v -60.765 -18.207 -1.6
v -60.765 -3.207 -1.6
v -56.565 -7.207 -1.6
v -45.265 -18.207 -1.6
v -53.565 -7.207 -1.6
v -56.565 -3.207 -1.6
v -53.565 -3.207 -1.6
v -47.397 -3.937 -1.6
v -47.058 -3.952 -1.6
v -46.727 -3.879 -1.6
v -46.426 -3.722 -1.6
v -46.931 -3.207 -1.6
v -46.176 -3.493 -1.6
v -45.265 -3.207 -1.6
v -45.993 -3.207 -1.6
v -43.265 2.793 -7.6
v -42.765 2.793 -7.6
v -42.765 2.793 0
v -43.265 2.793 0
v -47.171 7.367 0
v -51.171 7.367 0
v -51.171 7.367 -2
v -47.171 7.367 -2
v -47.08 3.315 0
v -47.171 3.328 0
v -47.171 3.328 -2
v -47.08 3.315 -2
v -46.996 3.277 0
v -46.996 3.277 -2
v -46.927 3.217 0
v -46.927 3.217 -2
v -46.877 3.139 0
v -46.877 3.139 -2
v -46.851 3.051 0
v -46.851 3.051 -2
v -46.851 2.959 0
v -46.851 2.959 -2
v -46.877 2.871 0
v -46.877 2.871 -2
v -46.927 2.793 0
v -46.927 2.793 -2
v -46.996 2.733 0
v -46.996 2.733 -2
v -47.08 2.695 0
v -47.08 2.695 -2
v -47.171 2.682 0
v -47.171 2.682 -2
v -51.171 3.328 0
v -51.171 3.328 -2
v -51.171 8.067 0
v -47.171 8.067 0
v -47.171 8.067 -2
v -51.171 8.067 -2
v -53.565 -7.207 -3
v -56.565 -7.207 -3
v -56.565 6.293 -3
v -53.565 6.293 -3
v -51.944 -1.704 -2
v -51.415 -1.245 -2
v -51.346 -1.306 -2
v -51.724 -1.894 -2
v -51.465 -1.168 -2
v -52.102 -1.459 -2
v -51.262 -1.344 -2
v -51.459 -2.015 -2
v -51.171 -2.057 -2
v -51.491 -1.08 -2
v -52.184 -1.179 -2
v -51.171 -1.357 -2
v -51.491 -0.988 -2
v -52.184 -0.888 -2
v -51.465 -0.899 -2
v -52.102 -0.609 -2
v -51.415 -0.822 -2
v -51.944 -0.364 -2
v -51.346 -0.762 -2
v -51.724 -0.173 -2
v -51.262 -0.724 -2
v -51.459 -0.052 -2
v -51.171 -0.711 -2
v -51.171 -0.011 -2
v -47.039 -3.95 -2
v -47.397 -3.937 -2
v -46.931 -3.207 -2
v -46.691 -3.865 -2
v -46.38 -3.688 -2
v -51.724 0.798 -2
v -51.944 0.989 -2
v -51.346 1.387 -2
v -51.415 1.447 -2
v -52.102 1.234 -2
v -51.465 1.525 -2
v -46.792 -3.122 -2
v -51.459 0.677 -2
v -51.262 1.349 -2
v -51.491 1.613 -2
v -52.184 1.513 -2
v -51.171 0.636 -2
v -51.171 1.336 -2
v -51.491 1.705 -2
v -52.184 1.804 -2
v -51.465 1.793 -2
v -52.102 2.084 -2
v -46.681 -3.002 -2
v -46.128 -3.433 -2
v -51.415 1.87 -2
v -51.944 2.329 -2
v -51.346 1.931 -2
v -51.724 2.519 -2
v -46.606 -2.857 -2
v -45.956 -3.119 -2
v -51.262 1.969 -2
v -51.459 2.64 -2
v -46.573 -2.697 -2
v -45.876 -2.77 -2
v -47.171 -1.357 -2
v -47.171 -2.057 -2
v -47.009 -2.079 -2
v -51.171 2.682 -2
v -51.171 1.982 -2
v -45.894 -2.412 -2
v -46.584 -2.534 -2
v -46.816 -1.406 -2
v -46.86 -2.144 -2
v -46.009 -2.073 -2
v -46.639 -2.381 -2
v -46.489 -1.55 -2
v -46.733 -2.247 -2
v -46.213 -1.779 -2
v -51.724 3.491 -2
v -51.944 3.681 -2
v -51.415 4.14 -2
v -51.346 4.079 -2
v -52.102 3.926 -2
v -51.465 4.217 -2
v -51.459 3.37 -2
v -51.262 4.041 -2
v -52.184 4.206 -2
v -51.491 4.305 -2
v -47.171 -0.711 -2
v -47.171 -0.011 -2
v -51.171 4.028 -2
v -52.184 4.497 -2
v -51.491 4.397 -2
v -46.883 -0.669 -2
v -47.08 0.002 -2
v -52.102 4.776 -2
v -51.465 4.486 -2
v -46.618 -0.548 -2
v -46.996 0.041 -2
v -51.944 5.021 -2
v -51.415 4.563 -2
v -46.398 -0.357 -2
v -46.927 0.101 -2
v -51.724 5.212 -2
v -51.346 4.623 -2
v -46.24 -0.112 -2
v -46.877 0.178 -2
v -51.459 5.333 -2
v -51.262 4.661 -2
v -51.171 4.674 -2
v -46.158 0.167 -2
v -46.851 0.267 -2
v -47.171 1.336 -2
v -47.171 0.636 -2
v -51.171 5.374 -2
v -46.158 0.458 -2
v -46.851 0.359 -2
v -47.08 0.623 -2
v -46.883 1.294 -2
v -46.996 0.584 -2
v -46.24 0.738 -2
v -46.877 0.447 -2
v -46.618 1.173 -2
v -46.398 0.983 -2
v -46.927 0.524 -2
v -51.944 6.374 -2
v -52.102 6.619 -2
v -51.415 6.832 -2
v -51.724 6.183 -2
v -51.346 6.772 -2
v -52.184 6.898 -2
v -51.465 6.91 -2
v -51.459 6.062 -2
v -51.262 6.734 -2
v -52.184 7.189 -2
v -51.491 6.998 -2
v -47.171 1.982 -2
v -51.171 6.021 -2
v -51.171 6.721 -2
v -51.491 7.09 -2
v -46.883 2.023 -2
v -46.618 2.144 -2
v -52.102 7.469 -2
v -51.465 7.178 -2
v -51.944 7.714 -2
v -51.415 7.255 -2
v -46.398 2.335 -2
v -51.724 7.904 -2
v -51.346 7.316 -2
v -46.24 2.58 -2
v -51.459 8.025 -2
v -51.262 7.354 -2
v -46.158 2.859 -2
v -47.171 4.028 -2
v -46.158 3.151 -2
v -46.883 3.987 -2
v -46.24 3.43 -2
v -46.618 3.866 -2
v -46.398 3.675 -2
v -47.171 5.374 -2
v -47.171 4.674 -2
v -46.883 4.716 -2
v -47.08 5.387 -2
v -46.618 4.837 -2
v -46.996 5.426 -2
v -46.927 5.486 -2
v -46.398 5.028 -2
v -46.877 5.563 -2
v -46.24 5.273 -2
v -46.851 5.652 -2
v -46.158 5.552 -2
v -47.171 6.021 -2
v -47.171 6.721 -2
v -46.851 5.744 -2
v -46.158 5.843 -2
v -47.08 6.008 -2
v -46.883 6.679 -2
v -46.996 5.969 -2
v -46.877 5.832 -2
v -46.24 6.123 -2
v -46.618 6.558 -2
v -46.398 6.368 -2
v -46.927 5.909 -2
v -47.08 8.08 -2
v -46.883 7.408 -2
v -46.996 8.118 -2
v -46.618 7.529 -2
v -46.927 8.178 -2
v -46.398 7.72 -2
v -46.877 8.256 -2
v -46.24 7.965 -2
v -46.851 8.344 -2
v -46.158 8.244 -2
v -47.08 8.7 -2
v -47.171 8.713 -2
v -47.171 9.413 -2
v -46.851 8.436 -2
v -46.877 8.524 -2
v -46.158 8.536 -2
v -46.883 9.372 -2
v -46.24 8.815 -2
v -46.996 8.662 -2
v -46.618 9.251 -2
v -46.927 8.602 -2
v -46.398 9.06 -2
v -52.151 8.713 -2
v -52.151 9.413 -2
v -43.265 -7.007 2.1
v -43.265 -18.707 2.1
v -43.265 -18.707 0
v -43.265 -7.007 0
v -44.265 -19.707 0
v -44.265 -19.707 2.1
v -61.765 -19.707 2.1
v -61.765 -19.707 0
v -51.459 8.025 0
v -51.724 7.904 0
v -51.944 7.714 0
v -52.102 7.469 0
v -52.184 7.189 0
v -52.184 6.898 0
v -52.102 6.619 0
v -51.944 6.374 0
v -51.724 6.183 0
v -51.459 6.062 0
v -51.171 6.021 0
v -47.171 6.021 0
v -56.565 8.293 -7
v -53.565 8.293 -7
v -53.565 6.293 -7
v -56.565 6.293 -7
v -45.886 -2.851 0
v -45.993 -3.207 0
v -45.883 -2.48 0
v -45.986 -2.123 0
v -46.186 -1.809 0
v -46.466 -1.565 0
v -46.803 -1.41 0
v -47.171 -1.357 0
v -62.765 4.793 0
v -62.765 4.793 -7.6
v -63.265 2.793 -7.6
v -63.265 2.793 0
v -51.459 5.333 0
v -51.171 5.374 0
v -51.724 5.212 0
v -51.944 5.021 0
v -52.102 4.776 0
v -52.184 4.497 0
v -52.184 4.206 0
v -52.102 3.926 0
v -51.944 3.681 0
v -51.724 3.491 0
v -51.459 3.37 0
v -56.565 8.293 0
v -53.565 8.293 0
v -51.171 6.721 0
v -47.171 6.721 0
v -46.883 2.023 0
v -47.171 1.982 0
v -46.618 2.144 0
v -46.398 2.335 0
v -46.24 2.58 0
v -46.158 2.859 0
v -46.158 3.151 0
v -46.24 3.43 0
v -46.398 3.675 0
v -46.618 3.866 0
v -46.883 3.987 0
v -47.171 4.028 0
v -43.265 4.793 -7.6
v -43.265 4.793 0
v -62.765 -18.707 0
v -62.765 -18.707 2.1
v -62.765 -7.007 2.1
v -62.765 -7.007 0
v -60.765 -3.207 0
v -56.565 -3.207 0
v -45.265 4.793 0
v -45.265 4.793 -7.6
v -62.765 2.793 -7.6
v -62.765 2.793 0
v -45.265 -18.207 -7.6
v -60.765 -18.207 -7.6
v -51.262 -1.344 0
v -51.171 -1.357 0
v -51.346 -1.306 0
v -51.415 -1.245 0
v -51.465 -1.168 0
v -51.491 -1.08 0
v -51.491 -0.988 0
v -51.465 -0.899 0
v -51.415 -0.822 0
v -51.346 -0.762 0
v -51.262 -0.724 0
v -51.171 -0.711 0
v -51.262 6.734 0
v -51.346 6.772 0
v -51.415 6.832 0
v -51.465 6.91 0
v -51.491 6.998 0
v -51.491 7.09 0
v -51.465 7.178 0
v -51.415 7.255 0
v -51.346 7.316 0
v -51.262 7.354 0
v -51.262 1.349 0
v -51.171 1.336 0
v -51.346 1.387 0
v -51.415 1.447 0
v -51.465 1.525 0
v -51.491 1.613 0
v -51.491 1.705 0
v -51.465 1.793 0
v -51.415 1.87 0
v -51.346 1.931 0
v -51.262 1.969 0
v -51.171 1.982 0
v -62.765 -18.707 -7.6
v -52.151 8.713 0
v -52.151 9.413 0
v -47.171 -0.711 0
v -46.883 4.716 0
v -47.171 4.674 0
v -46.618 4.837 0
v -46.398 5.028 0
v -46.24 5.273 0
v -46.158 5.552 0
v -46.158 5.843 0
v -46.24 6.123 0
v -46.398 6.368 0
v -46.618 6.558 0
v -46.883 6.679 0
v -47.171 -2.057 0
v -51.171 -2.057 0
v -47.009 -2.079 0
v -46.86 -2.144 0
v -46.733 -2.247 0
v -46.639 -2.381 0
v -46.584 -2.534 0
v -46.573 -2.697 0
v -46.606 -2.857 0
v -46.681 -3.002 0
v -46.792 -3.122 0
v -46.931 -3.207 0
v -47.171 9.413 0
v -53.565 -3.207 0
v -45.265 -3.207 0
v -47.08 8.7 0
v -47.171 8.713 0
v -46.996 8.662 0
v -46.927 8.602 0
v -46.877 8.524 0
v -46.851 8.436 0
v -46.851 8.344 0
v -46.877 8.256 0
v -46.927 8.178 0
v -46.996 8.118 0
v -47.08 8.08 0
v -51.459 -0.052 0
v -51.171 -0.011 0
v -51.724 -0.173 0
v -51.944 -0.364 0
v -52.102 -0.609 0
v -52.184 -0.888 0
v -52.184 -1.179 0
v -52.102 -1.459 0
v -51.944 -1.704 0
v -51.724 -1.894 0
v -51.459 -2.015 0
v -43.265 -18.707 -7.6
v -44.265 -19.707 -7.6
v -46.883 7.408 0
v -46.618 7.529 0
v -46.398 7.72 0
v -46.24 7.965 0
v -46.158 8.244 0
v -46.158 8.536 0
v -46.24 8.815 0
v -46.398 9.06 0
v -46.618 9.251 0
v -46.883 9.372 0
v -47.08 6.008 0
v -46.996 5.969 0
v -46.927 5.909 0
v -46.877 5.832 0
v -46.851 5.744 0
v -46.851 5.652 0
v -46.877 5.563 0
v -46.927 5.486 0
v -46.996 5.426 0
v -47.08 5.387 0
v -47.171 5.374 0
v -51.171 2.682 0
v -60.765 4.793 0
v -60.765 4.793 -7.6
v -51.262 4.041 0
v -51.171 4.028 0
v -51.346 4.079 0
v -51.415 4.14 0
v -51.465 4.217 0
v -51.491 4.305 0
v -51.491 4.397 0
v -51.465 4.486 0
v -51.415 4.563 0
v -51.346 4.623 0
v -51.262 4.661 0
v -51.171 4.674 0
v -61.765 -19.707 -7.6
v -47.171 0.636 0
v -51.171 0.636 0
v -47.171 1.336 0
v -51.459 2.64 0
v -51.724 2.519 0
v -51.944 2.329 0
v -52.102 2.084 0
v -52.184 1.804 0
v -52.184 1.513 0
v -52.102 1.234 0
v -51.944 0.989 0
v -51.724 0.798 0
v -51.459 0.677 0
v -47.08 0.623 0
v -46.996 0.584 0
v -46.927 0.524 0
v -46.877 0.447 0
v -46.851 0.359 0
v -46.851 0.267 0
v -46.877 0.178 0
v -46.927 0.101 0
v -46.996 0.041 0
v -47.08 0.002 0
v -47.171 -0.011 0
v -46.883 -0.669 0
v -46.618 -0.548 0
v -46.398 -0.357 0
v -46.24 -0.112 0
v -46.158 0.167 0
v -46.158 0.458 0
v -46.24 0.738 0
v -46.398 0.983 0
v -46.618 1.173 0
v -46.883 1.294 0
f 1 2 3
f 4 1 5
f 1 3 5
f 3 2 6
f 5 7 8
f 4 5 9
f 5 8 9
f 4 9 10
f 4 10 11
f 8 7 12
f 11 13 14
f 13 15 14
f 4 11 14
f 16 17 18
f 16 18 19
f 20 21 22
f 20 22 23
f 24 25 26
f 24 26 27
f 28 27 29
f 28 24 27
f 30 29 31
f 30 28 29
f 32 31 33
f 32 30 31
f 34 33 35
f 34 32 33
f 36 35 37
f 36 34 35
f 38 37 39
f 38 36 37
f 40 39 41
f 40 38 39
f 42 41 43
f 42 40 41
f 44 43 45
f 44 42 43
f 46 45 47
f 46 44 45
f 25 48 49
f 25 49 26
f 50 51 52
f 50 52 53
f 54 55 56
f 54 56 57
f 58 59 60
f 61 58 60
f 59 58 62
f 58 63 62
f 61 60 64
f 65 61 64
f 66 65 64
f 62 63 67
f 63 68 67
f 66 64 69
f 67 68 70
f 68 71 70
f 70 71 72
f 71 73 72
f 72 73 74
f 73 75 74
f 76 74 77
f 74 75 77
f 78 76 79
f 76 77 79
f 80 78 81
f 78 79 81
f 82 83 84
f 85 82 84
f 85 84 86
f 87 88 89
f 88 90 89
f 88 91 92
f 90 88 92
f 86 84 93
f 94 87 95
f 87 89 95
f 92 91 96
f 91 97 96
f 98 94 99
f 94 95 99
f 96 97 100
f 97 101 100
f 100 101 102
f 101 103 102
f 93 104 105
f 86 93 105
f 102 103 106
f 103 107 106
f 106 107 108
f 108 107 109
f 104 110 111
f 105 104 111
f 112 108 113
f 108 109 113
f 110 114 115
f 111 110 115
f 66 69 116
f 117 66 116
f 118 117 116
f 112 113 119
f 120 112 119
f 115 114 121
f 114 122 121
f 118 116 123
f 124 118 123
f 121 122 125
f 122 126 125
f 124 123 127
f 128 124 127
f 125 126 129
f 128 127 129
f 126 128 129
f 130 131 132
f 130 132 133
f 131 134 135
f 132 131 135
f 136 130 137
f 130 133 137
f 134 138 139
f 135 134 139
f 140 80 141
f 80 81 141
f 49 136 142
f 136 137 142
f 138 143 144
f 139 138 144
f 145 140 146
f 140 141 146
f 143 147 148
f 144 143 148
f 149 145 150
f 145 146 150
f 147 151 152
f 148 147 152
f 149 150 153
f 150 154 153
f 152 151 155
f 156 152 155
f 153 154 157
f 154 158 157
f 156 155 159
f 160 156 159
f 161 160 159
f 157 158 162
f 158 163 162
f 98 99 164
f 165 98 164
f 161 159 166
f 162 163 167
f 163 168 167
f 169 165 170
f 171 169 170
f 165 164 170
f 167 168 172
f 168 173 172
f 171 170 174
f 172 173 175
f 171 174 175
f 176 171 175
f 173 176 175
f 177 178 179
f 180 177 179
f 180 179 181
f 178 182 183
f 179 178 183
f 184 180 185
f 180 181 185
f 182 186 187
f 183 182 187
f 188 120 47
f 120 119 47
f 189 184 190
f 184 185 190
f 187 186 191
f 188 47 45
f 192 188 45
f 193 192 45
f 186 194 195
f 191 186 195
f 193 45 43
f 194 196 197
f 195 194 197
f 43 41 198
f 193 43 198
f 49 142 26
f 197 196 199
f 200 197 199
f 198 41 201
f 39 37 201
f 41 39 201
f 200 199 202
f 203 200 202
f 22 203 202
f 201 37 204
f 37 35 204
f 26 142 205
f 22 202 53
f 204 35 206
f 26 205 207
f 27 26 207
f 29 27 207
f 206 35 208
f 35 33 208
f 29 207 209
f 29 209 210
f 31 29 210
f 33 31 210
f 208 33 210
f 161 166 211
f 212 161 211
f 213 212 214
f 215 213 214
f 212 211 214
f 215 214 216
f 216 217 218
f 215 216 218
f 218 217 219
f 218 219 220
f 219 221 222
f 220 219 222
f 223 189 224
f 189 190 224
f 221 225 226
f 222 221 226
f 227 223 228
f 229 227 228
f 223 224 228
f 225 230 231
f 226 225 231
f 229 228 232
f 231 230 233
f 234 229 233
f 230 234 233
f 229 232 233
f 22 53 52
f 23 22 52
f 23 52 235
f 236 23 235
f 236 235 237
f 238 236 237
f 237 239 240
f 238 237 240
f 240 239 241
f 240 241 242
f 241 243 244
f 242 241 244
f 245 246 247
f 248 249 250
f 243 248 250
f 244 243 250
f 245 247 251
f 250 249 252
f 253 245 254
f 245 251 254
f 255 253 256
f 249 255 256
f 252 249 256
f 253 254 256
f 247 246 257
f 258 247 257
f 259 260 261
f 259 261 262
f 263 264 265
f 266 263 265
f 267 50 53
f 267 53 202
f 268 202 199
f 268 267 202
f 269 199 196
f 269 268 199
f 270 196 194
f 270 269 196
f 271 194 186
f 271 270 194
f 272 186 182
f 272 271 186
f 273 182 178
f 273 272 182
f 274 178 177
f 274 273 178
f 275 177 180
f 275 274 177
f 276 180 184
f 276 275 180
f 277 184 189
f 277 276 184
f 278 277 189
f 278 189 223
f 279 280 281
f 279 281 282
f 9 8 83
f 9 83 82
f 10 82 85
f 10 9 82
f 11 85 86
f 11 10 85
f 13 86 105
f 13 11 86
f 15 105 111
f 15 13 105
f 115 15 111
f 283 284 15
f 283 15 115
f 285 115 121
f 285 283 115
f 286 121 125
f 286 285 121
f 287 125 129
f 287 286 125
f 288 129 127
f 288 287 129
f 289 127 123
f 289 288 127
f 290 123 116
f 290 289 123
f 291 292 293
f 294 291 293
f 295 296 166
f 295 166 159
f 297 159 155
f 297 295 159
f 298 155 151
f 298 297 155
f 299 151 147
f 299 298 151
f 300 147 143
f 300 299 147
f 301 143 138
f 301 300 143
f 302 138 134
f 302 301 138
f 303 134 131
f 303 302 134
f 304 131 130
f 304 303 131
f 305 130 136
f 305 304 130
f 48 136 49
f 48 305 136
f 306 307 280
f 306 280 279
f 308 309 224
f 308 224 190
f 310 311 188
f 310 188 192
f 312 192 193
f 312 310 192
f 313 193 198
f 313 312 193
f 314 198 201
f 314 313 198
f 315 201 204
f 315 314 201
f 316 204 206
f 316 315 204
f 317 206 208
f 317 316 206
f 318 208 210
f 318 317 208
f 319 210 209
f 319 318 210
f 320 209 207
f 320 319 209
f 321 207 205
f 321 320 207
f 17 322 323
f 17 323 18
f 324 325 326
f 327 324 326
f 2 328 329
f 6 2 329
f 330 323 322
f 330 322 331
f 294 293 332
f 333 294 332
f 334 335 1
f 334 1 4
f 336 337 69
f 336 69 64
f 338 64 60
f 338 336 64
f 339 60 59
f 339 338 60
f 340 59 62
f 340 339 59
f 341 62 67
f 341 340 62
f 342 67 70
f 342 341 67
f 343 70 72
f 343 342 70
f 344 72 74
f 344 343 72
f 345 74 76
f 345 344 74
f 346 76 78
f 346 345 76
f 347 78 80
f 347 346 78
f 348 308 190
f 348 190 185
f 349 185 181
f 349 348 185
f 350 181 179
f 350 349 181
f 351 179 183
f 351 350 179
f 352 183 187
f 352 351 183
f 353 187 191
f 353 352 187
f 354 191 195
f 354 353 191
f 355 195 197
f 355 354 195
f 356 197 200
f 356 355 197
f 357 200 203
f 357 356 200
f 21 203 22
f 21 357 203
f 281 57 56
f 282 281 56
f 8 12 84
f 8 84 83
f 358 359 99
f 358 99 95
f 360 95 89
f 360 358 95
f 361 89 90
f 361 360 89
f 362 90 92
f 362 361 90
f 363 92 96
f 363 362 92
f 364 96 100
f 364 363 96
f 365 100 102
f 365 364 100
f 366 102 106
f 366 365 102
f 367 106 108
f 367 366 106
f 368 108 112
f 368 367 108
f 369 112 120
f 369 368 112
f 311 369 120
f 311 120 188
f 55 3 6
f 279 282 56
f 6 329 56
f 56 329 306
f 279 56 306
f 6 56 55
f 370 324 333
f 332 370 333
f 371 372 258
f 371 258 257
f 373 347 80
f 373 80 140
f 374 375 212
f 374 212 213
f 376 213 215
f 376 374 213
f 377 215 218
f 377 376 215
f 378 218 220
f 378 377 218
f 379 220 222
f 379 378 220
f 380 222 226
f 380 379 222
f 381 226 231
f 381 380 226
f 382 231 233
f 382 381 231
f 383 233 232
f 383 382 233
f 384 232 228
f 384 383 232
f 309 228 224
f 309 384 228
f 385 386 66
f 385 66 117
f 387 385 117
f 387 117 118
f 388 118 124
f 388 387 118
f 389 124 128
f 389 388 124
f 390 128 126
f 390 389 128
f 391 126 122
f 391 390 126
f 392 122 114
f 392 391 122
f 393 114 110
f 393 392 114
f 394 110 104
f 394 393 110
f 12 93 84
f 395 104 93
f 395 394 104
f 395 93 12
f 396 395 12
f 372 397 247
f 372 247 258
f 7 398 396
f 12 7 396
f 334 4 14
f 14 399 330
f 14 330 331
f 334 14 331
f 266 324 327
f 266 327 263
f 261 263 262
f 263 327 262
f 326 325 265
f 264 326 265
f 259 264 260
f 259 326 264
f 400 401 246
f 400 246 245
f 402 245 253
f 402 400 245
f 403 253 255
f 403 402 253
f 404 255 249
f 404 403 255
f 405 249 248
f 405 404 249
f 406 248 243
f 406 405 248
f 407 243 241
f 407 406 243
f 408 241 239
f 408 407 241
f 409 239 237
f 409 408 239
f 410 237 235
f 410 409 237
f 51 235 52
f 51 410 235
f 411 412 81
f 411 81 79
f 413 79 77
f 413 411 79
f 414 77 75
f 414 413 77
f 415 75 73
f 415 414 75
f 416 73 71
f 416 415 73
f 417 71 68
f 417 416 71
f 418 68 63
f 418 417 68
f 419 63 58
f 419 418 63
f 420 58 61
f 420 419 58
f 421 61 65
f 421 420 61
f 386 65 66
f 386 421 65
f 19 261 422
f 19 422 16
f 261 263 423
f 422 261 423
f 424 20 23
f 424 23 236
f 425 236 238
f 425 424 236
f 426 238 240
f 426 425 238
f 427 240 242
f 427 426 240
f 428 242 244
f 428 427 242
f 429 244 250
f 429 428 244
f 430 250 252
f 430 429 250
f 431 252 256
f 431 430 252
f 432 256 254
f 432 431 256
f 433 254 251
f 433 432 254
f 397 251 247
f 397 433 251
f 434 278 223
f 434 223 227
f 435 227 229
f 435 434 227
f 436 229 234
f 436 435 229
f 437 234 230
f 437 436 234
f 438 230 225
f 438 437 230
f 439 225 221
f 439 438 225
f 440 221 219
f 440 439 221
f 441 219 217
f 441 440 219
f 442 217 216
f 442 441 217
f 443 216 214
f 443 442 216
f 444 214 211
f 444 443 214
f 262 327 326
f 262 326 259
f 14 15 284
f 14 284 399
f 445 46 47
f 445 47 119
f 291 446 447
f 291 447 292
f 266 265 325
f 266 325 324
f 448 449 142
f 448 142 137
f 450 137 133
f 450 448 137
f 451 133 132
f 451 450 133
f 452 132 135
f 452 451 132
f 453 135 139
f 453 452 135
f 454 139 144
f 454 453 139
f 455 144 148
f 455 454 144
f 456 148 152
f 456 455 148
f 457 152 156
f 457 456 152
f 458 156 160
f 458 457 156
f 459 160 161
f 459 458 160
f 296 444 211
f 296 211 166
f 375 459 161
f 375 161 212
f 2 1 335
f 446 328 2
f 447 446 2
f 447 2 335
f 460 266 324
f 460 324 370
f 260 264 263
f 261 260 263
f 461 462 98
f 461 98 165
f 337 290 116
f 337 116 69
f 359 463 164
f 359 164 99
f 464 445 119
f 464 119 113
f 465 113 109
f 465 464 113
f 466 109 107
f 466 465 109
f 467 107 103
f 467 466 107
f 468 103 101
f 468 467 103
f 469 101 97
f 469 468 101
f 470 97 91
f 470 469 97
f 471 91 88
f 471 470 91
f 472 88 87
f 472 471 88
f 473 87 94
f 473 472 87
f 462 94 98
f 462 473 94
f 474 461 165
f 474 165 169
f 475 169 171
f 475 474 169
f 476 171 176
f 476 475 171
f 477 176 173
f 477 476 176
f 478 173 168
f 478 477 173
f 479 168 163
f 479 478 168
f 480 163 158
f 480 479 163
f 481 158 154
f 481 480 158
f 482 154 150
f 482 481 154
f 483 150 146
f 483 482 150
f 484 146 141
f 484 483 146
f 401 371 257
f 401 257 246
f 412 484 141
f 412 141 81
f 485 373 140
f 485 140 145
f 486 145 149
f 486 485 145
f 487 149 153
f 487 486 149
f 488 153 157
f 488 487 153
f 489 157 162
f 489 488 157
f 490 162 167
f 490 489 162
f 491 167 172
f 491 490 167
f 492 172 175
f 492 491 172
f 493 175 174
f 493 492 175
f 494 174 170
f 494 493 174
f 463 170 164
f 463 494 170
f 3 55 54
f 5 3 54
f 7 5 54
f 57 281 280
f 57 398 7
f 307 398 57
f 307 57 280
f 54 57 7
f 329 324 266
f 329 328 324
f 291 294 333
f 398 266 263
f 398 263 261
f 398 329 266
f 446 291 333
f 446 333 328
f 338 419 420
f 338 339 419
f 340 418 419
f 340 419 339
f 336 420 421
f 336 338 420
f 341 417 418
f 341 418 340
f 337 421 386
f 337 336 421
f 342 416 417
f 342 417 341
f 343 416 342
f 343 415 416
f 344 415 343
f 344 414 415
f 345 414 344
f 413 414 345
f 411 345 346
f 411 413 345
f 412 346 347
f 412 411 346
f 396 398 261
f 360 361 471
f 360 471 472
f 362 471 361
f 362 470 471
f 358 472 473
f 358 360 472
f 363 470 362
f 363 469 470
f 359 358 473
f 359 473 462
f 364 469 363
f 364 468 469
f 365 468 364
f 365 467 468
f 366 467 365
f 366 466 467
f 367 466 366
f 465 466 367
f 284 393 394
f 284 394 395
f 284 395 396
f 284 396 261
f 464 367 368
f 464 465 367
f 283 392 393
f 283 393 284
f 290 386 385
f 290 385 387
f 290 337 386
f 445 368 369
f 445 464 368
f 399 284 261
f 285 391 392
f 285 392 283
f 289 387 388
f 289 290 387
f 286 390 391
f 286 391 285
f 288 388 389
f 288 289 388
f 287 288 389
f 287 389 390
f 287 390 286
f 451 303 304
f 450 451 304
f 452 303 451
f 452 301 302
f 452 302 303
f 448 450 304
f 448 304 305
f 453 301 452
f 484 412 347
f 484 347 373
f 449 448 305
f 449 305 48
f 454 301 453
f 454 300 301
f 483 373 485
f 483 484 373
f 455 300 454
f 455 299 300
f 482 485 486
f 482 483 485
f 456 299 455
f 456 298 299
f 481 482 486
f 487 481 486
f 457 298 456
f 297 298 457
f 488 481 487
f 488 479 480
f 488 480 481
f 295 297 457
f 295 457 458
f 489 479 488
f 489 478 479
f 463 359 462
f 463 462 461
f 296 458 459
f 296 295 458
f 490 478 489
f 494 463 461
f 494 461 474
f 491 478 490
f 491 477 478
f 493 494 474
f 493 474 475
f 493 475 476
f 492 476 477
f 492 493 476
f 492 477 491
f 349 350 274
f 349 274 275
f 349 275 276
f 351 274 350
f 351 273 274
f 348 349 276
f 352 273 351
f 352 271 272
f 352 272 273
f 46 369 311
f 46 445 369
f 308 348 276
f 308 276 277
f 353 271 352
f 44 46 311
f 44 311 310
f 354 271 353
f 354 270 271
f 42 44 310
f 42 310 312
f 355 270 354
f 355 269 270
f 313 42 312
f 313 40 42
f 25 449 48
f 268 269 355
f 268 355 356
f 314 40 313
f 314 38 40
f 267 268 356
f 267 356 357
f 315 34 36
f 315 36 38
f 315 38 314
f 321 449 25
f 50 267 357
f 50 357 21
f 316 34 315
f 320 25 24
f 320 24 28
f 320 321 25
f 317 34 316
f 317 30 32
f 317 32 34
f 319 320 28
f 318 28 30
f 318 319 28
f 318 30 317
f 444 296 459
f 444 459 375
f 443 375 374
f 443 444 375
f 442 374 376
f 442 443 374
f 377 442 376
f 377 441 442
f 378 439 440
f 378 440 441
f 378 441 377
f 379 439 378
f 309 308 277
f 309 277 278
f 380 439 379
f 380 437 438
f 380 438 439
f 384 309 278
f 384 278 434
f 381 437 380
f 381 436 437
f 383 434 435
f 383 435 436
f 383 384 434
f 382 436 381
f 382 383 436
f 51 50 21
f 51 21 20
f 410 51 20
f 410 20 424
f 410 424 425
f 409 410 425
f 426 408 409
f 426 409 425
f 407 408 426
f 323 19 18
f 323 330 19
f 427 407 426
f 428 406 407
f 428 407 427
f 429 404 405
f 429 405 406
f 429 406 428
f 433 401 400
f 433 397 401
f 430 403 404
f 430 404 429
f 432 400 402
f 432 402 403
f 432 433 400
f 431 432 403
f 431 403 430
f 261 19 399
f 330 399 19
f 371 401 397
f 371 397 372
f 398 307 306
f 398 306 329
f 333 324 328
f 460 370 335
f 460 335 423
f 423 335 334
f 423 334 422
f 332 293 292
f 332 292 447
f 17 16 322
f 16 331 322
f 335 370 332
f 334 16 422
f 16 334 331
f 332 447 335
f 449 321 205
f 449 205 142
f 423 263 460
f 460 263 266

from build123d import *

# Parameters (mm, degrees)
SKETCH_1_W           = 19.5
SKETCH_1_H           = 12.7
EXTRUDE_1_DEPTH      = 2.1
SKETCH_2_W           = 19.5
SKETCH_2_H           = 24.5
EXTRUDE_2_DEPTH      = 7.6
SKETCH_3_W           = 15.5
SKETCH_3_H           = 6
CUT_EXTRUDE_1_DEPTH  = 23
CUT_EXTRUDE_2_REACH  = 68.224
SKETCH_4_W           = 15.5
SKETCH_4_H           = 8
EXTRUDE_4_DEPTH      = 7.6
EXTRUDE_5_DEPTH      = 2
EXTRUDE_6_DEPTH      = 11.5
EXTRUDE_6_DEPTH_BACK = 4
SKETCH_8_W           = 3
SKETCH_8_H           = 3
SKETCH_9_W           = 3
SKETCH_9_H           = 2
EXTRUDE_7_DEPTH      = 4
CHAMFER_1_SIZE       = 1


# Read off the part's stored shape, not the designer's step: 分割1
with BuildPart() as part:
    # 草图1 → 凸台-拉伸1 (new body)
    with BuildSketch(Plane.XY):
        with Locations((-53.015330564, -13.356843897)):
            Rectangle(SKETCH_1_W, SKETCH_1_H)
    extrude(amount=EXTRUDE_1_DEPTH)

    # 草图2 → 凸台-拉伸2 (add)
    with BuildSketch(Plane(origin=(0, 0, 0), x_dir=(-1, 0, 0), z_dir=(0, 0, -1))):
        with Locations((53.015330564, -7.456843897)):
            Rectangle(SKETCH_2_W, SKETCH_2_H)
    extrude(amount=EXTRUDE_2_DEPTH)

    # 草图3 → 切除-拉伸1 (cut)
    with BuildSketch(Plane(origin=(0, 4.793156103, 0), x_dir=(1, 0, 0), z_dir=(0, 1, 0))):
        with Locations((-53.015330564, 4.6)):
            Rectangle(SKETCH_3_W, SKETCH_3_H)
    extrude(amount=-CUT_EXTRUDE_1_DEPTH, mode=Mode.SUBTRACT)

    # 草图4 → 切除-拉伸2 (cut, up to next)
    with BuildSketch(Plane.XY, mode=Mode.PRIVATE) as cut_extrude_2_sk1:
        with Locations((-53.015330564, 0.793156103)):
            Rectangle(SKETCH_4_W, SKETCH_4_H)
    cut_extrude_2_tool1 = extrude(cut_extrude_2_sk1.sketch, amount=-CUT_EXTRUDE_2_REACH, mode=Mode.PRIVATE) & part.part
    add(cut_extrude_2_tool1.solids().sort_by_distance((-53.015331, 0.793156, 0))[0], mode=Mode.SUBTRACT)

    # 草图5 → 凸台-拉伸4 (add)
    with BuildSketch(Plane(origin=(0, 0, -7.6), x_dir=(-1, 0, 0), z_dir=(0, 0, -1))):
        Polygon((62.765330564, 4.793156103), (63.265330564, 2.793156103), (62.765330564, 2.793156103), align=None)
        Polygon((43.265330564, 4.793156103), (42.765330564, 2.793156103), (43.265330564, 2.793156103), align=None)
    extrude(amount=-EXTRUDE_4_DEPTH)

    # 草图7 → 凸台-拉伸5 (add)
    with BuildSketch(Plane.XY):
        with BuildLine():
            Line((-47.171144023, -1.356843897), (-51.171144023, -1.356843897))
            ThreePointArc((-51.171144023, -1.356843897), (-51.494269023, -1.033718897), (-51.171144023, -0.710593897))
            Line((-51.171144023, -0.710593897), (-47.171144023, -0.710593897))
            ThreePointArc((-47.171144023, -0.710593897), (-46.148019023, 0.312531103), (-47.171144023, 1.335656103))
            Line((-47.171144023, 1.335656103), (-51.171144023, 1.335656103))
            ThreePointArc((-51.171144023, 1.335656103), (-51.494269023, 1.658781103), (-51.171144023, 1.981906103))
            Line((-51.171144023, 1.981906103), (-47.171144023, 1.981906103))
            ThreePointArc((-47.171144023, 1.981906103), (-46.148019023, 3.005031103), (-47.171144023, 4.028156103))
            Line((-47.171144023, 4.028156103), (-51.171144023, 4.028156103))
            ThreePointArc((-51.171144023, 4.028156103), (-51.494269023, 4.351281103), (-51.171144023, 4.674406103))
            Line((-51.171144023, 4.674406103), (-47.171144023, 4.674406103))
            ThreePointArc((-47.171144023, 4.674406103), (-46.148019023, 5.697531103), (-47.171144023, 6.720656103))
            Line((-47.171144023, 6.720656103), (-51.171144023, 6.720656103))
            ThreePointArc((-51.171144023, 6.720656103), (-51.494269023, 7.043781103), (-51.171144023, 7.366906103))
            Line((-51.171144023, 7.366906103), (-47.171144023, 7.366906103))
            ThreePointArc((-47.171144023, 7.366906103), (-46.148019023, 8.390031103), (-47.171144023, 9.413156103))
            Line((-47.171144023, 9.413156103), (-52.150877486, 9.413156103))
            Line((-52.150877486, 9.413156103), (-52.150877486, 8.713156103))
            Line((-52.150877486, 8.713156103), (-47.171144023, 8.713156103))
            ThreePointArc((-47.171144023, 8.713156103), (-46.848019023, 8.390031103), (-47.171144023, 8.066906103))
            Line((-47.171144023, 8.066906103), (-51.171144023, 8.066906103))
            ThreePointArc((-51.171144023, 8.066906103), (-52.194269023, 7.043781103), (-51.171144023, 6.020656103))
            Line((-51.171144023, 6.020656103), (-47.171144023, 6.020656103))
            ThreePointArc((-47.171144023, 6.020656103), (-46.848019023, 5.697531103), (-47.171144023, 5.374406103))
            Line((-47.171144023, 5.374406103), (-51.171144023, 5.374406103))
            ThreePointArc((-51.171144023, 5.374406103), (-52.194269023, 4.351281103), (-51.171144023, 3.328156103))
            Line((-51.171144023, 3.328156103), (-47.171144023, 3.328156103))
            ThreePointArc((-47.171144023, 3.328156103), (-46.848019023, 3.005031103), (-47.171144023, 2.681906103))
            Line((-47.171144023, 2.681906103), (-51.171144023, 2.681906103))
            ThreePointArc((-51.171144023, 2.681906103), (-52.194269023, 1.658781103), (-51.171144023, 0.635656103))
            Line((-51.171144023, 0.635656103), (-47.171144023, 0.635656103))
            ThreePointArc((-47.171144023, 0.635656103), (-46.848019023, 0.312531103), (-47.171144023, -0.010593897))
            Line((-47.171144023, -0.010593897), (-51.171144023, -0.010593897))
            ThreePointArc((-51.171144023, -0.010593897), (-52.194269023, -1.033718897), (-51.171144023, -2.056843897))
            Line((-51.171144023, -2.056843897), (-47.171144023, -2.056843897))
            ThreePointArc((-47.171144023, -2.056843897), (-46.583777016, -2.53436941), (-46.931352446, -3.206843897))
            Line((-46.931352446, -3.206843897), (-47.396871104, -3.937096718))
            ThreePointArc((-47.396871104, -3.937096718), (-45.876090227, -2.770138498), (-47.171144023, -1.356843897))
        make_face()
    extrude(amount=-EXTRUDE_5_DEPTH)

    # 草图8 → 凸台-拉伸6 (add, two sides: drawn at the far end of the back side and taken through both)
    with BuildSketch(Plane(origin=(0, -3.206843897, 0), x_dir=(1, 0, 0), z_dir=(0, 1, 0)).offset(-EXTRUDE_6_DEPTH_BACK)):
        with Locations((-55.065330564, 1.5)):
            Rectangle(SKETCH_8_W, SKETCH_8_H)
    extrude(amount=EXTRUDE_6_DEPTH + EXTRUDE_6_DEPTH_BACK)

    # 草图9 → 凸台-拉伸7 (add)
    with BuildSketch(Plane(origin=(0, 0, -3), x_dir=(-1, 0, 0), z_dir=(0, 0, -1))):
        with Locations((55.065330564, 7.293156103)):
            Rectangle(SKETCH_9_W, SKETCH_9_H)
    extrude(amount=EXTRUDE_7_DEPTH)

    # 倒角1
    chamfer_1_edges = [part.edges().sort_by_distance(p)[0] for p in [
        (-43.265330564, -19.706843897, -2.75),
        (-62.765330564, -19.706843897, -2.75),
    ]]
    chamfer(chamfer_1_edges, length=CHAMFER_1_SIZE)


with BuildPart() as body_2:
    # Split Bodies 1: the piece on the far side of the plane
    add(part.part)
    split(bisect_by=Plane.XY, keep=Keep.BOTTOM)


with BuildPart() as part_1:
    add(part.part)

    # Split Bodies 1
    split(bisect_by=Plane.XY, keep=Keep.TOP)


solid = Compound([body_2.part, part_1.part])
